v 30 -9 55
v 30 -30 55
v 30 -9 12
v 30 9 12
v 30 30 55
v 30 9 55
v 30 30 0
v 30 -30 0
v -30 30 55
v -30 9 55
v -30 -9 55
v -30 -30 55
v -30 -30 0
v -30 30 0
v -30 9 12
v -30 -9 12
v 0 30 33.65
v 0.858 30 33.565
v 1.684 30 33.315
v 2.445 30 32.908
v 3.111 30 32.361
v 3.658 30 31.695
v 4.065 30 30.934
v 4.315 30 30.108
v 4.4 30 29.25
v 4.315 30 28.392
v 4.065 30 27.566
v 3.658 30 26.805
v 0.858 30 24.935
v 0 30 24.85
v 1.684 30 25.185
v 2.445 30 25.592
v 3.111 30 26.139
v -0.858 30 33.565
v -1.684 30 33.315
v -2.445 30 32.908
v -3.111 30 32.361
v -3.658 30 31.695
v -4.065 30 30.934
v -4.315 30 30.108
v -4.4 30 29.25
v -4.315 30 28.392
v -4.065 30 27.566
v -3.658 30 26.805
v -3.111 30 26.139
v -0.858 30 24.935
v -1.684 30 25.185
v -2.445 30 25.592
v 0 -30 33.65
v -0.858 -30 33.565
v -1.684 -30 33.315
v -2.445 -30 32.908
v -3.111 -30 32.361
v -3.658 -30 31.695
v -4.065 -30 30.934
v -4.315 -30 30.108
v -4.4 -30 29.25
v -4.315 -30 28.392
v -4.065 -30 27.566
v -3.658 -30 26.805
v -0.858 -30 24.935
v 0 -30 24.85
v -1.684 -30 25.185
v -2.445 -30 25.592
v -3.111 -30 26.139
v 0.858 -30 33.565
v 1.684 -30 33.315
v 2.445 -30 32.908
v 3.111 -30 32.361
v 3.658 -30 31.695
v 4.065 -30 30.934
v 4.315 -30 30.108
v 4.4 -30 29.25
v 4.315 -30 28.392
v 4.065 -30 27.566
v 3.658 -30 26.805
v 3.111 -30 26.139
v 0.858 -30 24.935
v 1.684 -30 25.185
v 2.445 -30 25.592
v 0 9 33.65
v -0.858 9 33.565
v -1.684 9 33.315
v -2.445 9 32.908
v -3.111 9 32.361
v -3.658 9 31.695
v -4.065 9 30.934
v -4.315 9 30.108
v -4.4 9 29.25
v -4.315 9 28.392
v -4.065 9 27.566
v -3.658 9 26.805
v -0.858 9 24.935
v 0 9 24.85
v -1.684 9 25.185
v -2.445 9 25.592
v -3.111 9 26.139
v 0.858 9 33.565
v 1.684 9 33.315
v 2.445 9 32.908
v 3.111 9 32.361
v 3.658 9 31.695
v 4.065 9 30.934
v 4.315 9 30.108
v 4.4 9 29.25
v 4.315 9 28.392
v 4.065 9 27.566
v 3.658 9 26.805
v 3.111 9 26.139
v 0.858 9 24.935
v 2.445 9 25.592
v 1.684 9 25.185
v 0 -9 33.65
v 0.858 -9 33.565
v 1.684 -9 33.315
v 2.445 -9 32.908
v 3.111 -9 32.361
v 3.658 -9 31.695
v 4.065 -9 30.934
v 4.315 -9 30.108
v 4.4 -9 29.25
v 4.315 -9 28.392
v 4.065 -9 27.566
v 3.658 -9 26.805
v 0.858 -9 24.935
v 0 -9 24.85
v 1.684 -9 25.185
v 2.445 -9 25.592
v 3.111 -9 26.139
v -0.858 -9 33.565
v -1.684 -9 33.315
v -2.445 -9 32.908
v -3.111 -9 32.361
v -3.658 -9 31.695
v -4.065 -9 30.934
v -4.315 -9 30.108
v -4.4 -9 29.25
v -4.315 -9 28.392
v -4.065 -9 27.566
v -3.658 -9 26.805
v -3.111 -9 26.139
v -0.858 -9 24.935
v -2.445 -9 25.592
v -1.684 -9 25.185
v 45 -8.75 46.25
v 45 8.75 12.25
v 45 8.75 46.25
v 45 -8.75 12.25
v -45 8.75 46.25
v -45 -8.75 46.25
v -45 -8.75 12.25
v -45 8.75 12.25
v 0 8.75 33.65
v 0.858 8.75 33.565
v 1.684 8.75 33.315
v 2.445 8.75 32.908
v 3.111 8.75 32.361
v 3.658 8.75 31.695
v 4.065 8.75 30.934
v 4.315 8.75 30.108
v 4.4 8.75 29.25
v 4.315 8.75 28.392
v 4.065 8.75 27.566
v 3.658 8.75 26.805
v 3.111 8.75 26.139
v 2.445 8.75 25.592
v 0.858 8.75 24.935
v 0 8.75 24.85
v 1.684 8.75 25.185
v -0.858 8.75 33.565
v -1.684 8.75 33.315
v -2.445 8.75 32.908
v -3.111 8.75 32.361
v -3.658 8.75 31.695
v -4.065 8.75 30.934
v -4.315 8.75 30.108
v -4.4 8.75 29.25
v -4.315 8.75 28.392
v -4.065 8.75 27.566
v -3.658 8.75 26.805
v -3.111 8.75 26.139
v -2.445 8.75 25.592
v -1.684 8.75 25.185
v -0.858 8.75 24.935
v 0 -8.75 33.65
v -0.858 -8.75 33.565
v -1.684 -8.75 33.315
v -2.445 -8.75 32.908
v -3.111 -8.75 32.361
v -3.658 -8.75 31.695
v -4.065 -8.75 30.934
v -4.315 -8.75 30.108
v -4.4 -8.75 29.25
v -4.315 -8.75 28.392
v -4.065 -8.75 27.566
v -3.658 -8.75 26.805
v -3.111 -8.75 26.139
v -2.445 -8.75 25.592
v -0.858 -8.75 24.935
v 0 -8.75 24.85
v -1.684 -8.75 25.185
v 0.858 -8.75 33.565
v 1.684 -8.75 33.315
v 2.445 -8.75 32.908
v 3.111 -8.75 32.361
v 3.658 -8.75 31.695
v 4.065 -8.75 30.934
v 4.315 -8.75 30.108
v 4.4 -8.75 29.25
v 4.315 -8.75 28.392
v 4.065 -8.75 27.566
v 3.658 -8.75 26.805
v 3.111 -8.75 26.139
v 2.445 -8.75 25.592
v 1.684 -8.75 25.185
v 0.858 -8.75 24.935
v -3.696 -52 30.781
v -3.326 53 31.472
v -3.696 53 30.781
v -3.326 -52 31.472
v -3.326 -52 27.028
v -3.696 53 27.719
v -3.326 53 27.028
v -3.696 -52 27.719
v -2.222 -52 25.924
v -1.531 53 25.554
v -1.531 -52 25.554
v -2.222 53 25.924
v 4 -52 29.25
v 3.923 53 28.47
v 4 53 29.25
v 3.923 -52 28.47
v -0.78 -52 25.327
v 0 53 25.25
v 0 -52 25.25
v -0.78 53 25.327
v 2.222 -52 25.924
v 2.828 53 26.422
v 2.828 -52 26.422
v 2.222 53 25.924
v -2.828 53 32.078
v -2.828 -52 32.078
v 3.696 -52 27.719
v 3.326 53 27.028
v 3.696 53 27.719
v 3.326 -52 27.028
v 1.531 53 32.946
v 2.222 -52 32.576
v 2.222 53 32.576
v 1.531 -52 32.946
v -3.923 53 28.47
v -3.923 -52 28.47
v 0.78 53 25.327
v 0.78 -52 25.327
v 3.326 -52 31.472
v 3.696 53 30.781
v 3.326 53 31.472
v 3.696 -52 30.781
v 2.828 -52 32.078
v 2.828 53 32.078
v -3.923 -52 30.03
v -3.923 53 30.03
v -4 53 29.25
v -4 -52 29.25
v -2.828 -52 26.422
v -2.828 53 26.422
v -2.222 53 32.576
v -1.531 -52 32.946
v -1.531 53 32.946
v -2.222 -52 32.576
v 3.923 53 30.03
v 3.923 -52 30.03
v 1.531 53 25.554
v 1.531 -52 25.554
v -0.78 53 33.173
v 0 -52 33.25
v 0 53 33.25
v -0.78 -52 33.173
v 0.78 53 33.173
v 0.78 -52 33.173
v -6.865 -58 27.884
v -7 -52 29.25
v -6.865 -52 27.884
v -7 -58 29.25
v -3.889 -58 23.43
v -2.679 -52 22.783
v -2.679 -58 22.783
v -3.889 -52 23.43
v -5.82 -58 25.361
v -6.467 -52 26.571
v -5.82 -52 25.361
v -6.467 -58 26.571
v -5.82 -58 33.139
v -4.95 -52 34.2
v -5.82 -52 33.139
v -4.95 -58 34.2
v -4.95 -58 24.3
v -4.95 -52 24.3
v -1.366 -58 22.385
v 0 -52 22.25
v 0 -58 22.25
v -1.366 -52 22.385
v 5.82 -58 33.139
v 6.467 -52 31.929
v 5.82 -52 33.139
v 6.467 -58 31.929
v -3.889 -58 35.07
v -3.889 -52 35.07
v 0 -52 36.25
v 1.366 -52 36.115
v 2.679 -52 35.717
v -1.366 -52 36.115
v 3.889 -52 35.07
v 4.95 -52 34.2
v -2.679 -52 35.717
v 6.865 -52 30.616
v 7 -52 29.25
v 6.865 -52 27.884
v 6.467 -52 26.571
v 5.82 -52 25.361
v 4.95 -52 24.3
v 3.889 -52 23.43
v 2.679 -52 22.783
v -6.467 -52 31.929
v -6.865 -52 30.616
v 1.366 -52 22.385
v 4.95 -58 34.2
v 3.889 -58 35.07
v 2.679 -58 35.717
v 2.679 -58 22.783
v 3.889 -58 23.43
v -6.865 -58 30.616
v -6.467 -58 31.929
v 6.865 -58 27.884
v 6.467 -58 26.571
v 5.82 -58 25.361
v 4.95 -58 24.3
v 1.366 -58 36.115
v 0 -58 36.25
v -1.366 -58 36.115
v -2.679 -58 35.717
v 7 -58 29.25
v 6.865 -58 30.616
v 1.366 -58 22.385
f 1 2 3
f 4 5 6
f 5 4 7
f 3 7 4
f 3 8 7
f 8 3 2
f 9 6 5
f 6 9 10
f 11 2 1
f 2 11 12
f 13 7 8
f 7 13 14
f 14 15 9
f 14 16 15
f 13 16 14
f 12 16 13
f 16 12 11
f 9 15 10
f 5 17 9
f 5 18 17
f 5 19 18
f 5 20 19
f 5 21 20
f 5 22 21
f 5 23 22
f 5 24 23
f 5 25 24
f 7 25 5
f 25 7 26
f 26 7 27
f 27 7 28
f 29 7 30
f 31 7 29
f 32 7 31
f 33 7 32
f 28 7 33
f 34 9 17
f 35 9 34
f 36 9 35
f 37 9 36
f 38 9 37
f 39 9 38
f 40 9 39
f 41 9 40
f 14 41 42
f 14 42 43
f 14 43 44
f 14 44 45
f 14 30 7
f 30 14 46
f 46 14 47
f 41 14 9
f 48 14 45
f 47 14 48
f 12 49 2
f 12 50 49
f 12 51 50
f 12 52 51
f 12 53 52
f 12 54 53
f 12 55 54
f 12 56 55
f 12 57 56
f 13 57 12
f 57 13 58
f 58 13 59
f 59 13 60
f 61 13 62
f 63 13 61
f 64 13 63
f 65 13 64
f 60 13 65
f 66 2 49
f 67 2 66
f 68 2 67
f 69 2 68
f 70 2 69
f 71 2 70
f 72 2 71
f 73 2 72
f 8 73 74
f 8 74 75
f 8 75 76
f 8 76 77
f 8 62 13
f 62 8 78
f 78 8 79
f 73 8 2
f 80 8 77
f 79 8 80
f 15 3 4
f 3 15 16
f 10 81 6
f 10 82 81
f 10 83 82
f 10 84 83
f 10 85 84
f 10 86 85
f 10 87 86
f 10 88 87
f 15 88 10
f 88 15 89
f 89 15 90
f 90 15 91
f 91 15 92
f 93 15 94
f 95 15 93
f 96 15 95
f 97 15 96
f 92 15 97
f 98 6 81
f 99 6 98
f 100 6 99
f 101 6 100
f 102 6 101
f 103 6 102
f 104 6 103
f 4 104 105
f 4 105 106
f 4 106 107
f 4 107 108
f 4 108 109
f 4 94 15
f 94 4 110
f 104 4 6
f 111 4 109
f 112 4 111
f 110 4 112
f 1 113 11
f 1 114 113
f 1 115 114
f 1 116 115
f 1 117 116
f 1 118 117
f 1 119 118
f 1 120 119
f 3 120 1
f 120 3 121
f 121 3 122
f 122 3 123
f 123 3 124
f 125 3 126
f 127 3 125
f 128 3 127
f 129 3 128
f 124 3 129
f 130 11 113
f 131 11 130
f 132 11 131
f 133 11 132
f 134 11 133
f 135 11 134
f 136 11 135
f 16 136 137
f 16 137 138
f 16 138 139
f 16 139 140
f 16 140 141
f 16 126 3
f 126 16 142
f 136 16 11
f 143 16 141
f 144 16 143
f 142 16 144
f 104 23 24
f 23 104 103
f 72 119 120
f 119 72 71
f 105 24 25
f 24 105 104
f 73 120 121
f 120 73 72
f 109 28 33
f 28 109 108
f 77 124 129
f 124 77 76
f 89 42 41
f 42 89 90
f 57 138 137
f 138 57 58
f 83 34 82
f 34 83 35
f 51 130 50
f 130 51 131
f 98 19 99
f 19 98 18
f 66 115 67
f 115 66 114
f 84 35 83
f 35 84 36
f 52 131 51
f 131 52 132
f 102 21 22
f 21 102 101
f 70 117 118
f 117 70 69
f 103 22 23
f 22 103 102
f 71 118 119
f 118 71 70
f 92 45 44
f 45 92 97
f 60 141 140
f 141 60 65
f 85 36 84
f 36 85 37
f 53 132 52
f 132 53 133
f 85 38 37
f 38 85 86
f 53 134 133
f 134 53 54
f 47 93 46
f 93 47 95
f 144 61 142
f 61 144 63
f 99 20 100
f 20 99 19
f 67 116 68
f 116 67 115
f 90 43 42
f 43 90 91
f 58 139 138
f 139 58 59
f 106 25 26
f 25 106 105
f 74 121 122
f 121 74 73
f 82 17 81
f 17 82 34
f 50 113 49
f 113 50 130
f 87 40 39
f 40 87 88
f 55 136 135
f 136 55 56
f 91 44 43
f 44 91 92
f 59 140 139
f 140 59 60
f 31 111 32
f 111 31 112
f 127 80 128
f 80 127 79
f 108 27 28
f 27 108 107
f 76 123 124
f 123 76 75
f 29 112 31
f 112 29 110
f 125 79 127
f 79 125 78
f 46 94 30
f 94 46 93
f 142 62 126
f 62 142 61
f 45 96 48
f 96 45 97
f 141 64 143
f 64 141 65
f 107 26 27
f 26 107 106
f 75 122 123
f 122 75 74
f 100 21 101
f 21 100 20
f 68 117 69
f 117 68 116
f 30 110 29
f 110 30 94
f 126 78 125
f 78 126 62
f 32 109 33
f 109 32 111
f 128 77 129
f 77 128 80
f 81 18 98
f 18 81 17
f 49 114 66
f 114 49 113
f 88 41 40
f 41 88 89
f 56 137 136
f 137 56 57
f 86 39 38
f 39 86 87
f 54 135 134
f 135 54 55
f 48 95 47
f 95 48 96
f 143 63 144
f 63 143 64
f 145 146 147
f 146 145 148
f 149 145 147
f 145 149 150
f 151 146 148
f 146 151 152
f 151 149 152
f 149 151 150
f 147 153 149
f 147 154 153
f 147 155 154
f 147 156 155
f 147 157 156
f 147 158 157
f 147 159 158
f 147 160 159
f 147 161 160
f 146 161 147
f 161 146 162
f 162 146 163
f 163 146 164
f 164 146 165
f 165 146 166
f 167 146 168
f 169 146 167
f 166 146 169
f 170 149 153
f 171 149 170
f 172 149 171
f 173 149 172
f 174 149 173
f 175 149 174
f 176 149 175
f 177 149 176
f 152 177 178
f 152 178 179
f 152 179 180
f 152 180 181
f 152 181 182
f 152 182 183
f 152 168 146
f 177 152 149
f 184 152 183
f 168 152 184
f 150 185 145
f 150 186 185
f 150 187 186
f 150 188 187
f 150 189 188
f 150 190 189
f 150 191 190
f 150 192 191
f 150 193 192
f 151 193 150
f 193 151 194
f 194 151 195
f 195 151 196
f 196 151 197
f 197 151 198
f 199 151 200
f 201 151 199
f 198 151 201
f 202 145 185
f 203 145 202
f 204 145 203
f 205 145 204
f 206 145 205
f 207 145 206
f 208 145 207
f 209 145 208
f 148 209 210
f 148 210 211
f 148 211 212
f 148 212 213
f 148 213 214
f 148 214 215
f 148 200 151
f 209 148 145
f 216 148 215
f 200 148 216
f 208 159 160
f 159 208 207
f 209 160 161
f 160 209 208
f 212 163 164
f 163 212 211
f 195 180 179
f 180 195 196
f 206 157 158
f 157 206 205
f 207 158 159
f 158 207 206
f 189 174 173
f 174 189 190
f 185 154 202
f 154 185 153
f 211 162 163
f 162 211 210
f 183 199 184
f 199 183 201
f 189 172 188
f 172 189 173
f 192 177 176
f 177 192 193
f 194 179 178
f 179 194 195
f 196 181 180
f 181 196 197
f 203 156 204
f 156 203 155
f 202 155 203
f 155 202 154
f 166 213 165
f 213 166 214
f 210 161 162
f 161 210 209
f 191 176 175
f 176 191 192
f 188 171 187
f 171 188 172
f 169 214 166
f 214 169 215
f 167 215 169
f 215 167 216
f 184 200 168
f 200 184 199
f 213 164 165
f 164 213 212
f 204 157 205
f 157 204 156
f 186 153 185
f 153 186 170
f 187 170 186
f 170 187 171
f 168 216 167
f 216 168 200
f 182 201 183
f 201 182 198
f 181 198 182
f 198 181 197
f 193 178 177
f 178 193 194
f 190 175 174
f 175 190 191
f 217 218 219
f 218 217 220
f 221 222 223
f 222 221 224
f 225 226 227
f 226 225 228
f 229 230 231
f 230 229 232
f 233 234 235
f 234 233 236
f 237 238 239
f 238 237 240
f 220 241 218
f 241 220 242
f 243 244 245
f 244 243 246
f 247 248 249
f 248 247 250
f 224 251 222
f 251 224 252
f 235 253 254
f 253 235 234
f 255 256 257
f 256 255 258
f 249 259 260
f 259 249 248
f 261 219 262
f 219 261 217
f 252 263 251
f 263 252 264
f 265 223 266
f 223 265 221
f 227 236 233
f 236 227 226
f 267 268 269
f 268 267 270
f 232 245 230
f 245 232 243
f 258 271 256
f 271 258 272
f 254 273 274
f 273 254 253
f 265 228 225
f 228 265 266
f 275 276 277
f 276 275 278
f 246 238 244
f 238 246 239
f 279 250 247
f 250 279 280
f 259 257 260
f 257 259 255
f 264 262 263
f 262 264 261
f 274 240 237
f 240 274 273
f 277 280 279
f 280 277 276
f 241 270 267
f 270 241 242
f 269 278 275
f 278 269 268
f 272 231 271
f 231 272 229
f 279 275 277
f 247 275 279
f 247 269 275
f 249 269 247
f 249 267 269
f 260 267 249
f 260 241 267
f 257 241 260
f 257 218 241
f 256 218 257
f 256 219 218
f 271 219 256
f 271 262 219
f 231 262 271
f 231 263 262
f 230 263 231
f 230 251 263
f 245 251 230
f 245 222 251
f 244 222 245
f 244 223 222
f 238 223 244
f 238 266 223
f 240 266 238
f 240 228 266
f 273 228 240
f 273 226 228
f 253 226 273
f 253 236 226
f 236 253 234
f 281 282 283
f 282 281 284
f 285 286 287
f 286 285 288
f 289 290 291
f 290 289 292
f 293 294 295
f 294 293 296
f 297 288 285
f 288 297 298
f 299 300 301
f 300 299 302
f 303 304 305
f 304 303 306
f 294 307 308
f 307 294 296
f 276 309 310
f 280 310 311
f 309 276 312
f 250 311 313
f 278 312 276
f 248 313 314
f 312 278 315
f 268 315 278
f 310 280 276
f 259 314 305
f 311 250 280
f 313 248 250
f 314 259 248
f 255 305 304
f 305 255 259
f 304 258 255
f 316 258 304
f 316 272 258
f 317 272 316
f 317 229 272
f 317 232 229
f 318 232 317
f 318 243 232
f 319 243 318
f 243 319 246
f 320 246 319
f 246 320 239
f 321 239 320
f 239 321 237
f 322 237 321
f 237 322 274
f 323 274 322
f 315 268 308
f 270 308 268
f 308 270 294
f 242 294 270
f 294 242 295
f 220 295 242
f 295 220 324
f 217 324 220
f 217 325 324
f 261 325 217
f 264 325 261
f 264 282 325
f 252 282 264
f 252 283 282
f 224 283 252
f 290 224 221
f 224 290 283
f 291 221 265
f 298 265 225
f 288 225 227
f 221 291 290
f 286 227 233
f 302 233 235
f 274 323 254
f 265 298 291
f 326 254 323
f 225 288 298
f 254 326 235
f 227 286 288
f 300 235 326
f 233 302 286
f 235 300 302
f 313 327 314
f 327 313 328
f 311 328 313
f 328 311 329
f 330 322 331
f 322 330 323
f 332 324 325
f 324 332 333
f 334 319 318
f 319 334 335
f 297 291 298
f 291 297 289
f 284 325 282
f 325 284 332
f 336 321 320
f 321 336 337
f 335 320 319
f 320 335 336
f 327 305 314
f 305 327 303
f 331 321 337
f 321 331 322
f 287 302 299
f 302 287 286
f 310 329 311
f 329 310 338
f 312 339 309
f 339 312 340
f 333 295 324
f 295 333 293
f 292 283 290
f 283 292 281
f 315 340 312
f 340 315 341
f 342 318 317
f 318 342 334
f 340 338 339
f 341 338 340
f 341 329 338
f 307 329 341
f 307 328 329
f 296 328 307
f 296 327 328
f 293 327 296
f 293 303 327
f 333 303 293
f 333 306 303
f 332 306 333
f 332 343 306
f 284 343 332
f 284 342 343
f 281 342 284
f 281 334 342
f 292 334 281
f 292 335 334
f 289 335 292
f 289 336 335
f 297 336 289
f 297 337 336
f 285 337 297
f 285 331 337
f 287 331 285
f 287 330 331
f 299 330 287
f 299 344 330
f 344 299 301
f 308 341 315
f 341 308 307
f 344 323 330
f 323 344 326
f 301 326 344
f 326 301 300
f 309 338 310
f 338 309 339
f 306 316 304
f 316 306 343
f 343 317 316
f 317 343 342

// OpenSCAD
$fn = 32;

// ------------------------------------------------------------------------
// Clevis joint: 60 mm clevis, pin d8
// Every part is its own module, assembly() places them once.
// ------------------------------------------------------------------------

// --- part 1 ---
module clevis() {
  difference() {
    translate([-30, -30, 0]) cube([60, 60, 55]);
    translate([-31, -9, 12]) cube([62, 18, 44]);
    translate([0, 0, 29.25]) rotate([90, 0, 0]) cylinder(h = 62, d = 8.8, center = true);
  }
}

// --- part 2 ---
module eye() {
  difference() {
    translate([-45, -8.75, 0]) cube([90, 17.5, 34]);
    translate([0, 0, 17]) rotate([90, 0, 0]) cylinder(h = 19.5, d = 8.8, center = true);
  }
}

// --- part 3 ---
module pin() {
  rotate([0, 90, 0]) cylinder(h = 106, d = 8, center = true);
  translate([-58, 0, 0]) rotate([0, 90, 0]) cylinder(h = 6, d = 14);
}

// --- assembly ---
module assembly() {
  translate([0, 0, 0]) rotate([0, 0, 0]) clevis();
  translate([0, 0, 12.25]) rotate([0, 0, 0]) eye();
  translate([0, 0, 29.25]) rotate([0, 0, 90]) pin();
}

assembly();
